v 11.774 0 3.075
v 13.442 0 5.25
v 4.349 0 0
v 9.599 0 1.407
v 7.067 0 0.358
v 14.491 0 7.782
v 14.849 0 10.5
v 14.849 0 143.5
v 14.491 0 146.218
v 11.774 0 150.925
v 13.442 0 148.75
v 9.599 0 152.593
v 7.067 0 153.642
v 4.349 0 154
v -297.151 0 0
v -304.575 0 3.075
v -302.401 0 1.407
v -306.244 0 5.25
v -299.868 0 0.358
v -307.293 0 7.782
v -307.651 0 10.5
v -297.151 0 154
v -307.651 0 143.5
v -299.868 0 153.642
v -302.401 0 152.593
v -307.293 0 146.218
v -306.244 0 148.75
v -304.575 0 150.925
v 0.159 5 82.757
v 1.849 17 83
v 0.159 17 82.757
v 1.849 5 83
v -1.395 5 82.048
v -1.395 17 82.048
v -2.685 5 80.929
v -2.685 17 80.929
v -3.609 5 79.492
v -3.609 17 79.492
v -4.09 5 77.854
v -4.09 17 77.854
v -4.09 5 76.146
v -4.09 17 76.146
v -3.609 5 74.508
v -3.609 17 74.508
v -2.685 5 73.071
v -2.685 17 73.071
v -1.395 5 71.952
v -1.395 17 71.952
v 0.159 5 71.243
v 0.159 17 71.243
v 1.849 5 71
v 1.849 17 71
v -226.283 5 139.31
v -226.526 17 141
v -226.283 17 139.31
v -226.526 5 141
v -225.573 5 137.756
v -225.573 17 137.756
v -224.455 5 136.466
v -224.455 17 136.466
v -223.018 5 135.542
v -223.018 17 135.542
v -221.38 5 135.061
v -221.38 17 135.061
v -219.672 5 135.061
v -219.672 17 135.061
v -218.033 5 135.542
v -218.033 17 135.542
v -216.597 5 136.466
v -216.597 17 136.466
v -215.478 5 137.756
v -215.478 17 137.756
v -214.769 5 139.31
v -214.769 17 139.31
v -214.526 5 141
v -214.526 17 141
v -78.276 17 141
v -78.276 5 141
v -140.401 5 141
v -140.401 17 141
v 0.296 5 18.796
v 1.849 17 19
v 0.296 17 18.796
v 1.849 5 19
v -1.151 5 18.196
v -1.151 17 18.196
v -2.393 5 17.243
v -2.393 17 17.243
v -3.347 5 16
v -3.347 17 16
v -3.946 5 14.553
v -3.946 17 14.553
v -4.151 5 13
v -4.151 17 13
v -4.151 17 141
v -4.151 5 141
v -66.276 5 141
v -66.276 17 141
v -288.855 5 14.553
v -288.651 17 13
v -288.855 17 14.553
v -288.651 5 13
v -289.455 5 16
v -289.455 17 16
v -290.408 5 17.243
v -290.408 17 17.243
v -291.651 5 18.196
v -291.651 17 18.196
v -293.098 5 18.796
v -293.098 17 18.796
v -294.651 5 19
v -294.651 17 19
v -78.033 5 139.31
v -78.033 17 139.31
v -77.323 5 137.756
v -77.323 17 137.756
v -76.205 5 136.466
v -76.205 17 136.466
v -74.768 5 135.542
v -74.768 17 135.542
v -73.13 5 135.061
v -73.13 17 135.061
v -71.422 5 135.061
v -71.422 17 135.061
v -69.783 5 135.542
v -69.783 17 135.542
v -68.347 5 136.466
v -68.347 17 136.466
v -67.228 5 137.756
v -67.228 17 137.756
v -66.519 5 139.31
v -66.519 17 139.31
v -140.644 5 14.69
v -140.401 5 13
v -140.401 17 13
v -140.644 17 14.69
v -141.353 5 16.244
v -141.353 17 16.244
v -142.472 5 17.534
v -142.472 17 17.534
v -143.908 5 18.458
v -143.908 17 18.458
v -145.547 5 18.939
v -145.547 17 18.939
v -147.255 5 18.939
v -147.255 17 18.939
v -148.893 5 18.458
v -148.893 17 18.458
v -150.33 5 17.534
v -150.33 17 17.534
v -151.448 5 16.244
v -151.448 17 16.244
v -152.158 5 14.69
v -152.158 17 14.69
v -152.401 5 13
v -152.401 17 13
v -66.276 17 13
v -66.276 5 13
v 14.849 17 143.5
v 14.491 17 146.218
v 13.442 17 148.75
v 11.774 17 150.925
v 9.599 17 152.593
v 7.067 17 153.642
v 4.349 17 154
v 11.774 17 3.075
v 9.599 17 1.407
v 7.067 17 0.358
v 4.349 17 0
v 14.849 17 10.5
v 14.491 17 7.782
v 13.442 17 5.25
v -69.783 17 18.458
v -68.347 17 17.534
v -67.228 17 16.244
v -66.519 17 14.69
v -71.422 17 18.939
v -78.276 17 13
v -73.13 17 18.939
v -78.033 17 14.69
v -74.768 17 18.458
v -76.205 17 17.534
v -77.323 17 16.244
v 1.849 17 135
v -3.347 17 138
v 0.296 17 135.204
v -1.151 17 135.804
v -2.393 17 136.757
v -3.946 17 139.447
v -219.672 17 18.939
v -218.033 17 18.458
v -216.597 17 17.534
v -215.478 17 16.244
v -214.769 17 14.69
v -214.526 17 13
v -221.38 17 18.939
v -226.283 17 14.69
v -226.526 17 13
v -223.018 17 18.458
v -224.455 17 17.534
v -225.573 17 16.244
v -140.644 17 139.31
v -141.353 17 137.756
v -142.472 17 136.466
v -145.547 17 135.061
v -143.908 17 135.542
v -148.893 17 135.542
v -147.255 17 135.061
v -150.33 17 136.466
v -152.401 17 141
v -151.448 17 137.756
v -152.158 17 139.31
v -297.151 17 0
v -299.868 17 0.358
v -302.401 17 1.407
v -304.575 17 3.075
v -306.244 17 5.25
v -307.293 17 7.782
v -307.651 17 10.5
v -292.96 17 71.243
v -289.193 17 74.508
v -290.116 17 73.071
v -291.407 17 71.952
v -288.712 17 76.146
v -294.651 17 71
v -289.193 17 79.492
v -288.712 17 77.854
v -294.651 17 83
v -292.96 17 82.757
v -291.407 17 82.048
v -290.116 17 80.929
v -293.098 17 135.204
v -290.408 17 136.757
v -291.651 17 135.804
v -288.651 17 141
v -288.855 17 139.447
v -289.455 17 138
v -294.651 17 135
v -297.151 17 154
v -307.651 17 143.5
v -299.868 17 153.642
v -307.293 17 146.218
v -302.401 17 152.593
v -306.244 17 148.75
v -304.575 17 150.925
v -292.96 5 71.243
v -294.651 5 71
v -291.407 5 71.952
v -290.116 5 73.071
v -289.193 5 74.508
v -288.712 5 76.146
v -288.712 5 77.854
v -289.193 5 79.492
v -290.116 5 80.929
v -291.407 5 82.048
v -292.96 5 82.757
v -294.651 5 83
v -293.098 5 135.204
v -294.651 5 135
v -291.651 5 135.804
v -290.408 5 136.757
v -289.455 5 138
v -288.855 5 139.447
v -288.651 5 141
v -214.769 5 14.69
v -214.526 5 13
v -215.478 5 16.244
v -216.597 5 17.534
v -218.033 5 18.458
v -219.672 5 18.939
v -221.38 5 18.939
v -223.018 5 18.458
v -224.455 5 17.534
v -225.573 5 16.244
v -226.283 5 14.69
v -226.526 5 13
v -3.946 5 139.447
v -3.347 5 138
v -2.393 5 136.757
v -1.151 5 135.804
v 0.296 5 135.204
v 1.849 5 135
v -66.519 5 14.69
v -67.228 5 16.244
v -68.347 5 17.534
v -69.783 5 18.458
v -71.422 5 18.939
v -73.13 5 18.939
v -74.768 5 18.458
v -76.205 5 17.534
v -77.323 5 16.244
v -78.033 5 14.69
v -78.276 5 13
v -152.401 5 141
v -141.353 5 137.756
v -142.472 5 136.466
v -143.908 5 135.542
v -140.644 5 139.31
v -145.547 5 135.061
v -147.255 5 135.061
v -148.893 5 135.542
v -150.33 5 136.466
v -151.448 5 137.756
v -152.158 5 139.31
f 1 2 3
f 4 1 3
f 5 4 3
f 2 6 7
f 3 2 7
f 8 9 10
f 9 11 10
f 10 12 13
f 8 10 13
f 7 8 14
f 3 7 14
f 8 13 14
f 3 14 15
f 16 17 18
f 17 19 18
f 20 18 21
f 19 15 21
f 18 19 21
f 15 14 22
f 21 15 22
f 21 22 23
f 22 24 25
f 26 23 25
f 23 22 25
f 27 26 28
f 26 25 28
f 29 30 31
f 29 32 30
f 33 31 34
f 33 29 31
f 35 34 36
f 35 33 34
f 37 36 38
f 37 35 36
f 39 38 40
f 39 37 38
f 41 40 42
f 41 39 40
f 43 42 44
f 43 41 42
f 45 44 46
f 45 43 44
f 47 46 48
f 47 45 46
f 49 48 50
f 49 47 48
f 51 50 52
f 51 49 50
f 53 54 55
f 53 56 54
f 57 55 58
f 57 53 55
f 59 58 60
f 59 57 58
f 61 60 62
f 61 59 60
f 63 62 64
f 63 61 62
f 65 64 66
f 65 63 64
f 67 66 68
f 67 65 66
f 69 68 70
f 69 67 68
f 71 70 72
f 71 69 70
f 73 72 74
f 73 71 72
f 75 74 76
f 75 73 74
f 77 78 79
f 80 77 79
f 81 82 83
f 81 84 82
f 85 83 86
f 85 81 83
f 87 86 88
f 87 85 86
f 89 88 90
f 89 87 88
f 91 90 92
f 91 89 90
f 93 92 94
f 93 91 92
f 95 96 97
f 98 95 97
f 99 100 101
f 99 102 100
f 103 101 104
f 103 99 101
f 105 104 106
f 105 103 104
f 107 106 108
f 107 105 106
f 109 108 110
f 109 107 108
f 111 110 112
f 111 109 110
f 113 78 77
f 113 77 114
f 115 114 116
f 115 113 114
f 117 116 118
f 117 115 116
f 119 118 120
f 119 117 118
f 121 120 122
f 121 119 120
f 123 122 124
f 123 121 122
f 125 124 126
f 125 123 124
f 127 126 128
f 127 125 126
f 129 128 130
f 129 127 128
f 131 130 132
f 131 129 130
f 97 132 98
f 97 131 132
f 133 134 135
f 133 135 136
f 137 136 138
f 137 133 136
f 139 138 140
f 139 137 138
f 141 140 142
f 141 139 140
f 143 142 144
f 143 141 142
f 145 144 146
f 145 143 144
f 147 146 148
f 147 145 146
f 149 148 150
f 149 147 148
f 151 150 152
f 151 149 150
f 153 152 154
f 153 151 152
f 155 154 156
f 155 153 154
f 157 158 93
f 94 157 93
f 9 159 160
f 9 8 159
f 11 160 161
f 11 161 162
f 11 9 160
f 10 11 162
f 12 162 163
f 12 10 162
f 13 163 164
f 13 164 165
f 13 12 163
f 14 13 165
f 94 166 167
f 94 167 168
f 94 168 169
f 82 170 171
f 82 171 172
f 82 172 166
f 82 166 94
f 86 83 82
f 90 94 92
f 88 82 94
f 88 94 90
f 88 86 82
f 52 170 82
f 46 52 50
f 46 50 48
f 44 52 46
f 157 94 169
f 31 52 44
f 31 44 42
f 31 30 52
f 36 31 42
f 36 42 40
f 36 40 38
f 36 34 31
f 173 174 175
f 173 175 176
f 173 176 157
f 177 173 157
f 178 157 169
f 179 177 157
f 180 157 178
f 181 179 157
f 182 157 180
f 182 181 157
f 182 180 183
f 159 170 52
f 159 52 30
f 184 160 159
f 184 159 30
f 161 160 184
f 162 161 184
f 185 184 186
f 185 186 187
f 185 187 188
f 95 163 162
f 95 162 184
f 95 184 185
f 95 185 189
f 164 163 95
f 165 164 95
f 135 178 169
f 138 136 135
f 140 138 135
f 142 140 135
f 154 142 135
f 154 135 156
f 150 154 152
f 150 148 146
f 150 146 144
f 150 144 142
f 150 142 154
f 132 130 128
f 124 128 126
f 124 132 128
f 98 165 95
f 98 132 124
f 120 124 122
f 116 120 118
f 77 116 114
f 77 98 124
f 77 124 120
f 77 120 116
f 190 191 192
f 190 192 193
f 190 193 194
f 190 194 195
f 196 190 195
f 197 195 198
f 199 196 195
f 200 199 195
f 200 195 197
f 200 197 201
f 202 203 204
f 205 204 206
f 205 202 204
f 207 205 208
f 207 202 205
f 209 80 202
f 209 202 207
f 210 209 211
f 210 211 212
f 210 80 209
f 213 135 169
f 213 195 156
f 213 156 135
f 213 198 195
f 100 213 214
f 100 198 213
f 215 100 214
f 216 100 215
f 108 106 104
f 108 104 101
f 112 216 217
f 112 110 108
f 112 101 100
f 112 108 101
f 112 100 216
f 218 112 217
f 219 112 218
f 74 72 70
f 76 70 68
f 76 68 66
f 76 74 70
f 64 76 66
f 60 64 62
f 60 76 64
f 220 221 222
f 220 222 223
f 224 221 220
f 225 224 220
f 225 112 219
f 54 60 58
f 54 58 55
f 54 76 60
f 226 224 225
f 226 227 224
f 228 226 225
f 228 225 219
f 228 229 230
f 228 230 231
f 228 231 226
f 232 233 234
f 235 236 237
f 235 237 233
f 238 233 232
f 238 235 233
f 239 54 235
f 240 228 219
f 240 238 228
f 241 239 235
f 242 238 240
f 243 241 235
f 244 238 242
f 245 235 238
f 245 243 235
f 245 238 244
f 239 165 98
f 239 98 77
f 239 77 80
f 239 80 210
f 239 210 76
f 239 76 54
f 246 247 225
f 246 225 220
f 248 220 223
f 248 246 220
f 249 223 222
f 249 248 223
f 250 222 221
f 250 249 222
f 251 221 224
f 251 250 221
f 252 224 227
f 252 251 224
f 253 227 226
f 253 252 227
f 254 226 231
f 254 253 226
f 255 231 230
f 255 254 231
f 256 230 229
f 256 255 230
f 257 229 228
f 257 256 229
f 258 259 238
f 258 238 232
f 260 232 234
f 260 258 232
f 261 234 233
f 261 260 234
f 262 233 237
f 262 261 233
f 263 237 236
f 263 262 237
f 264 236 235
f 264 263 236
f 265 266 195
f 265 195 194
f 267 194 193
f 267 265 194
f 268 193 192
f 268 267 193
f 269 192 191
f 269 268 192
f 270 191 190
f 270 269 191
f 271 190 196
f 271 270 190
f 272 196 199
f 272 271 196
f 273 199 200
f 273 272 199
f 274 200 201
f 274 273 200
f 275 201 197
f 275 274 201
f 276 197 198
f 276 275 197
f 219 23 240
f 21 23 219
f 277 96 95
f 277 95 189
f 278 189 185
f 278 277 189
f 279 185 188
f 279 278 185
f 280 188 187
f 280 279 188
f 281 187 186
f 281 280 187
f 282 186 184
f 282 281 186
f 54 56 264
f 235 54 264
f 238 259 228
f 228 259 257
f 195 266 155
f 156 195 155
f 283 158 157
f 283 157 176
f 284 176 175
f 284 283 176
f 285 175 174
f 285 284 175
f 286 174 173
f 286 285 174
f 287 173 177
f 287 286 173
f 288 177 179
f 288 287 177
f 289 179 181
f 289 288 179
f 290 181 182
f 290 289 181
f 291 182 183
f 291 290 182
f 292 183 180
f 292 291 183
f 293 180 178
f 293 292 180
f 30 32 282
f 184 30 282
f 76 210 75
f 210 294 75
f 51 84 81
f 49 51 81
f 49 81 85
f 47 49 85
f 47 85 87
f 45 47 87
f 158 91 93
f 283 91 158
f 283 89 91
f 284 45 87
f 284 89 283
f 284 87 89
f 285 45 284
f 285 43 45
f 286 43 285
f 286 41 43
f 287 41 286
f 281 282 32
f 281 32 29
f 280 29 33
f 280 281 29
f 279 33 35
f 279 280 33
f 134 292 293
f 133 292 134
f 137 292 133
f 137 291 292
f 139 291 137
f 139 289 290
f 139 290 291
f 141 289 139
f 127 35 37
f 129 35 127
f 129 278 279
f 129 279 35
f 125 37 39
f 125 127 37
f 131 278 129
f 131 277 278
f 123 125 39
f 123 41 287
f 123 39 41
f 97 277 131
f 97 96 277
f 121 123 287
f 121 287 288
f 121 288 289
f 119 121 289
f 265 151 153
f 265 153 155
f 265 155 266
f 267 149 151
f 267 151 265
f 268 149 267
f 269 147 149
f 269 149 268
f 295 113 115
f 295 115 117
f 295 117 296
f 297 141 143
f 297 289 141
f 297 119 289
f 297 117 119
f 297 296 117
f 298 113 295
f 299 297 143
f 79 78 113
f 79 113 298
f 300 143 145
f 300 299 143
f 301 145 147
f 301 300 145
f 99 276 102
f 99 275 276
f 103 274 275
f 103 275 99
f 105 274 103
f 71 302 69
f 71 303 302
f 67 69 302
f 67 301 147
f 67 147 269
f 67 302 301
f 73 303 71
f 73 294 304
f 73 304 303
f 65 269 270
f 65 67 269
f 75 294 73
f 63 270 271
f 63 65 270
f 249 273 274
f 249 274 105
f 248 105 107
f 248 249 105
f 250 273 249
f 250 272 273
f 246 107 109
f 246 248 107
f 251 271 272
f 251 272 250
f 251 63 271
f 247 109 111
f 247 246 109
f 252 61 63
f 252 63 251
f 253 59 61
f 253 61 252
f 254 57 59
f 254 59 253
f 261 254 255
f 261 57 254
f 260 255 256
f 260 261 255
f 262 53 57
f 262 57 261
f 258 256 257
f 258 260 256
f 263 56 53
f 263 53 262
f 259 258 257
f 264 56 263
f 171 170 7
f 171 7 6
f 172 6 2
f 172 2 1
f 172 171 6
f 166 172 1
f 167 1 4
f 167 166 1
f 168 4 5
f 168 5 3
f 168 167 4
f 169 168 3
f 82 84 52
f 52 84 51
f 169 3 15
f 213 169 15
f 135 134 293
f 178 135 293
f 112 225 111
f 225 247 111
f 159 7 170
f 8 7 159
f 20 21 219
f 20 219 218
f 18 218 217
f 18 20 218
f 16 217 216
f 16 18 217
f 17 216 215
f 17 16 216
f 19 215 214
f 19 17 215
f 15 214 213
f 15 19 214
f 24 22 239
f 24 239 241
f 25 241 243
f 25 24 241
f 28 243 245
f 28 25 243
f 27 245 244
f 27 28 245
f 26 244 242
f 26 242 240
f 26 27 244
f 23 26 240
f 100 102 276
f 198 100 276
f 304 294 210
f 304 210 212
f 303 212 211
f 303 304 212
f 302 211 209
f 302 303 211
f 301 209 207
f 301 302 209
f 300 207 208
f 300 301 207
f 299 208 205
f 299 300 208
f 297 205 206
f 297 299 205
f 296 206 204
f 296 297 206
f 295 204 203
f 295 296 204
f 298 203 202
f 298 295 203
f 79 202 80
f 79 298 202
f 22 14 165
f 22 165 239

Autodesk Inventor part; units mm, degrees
sketch "Эскиз1" plane through (0, 0, 0) normal (0, 1, 0) x (-1, 0, 0)
  arc A0 (294.6508, 19) -> (288.6508, 13) centre (294.6508, 13) ccw
  arc A1 (226.5258, 13) -> (214.5258, 13) centre (220.5258, 13) ccw
  arc A2 (152.4008, 13) -> (140.4008, 13) centre (146.4008, 13) ccw
  arc A3 (4.1508, 13) -> (-1.8492, 19) centre (-1.8492, 13) ccw
  arc A4 (78.2758, 13) -> (66.2758, 13) centre (72.2758, 13) ccw
  arc A5 (294.6508, 83) -> (294.6508, 71) centre (294.6508, 77) ccw
  arc A6 (288.6508, 141) -> (294.6508, 135) centre (294.6508, 141) ccw
  arc A7 (214.5258, 141) -> (226.5258, 141) centre (220.5258, 141) ccw
  arc A8 (140.4008, 141) -> (152.4008, 141) centre (146.4008, 141) ccw
  arc A9 (66.2758, 141) -> (78.2758, 141) centre (72.2758, 141) ccw
  arc A10 (-1.8492, 135) -> (4.1508, 141) centre (-1.8492, 141) ccw
  arc A11 (-1.8492, 71) -> (-1.8492, 83) centre (-1.8492, 77) ccw
  line L0 (-14.8492, 10.5) -> (-14.8492, 143.5)
  line L1 (-14.8492, 10.5) -> (-14.8492, 143.5)
  line L2 (-4.3492, 154) -> (297.1508, 154)
  line L3 (307.6508, 10.5) -> (307.6508, 143.5)
  line L4 (297.1508, 0) -> (-4.3492, 0)
  line L5 (288.6508, 13) -> (226.5258, 13)
  line L6 (214.5258, 13) -> (152.4008, 13)
  line L7 (140.4008, 13) -> (78.2758, 13)
  line L8 (66.2758, 13) -> (4.1508, 13)
  line L9 (-1.8492, 19) -> (-1.8492, 71)
  line L10 (-1.8492, 83) -> (-1.8492, 135)
  line L11 (4.1508, 141) -> (66.2758, 141)
  line L12 (78.2758, 141) -> (140.4008, 141)
  line L13 (152.4008, 141) -> (214.5258, 141)
  line L14 (226.5258, 141) -> (288.6508, 141)
  line L15 (294.6508, 135) -> (294.6508, 83)
  line L16 (294.6508, 71) -> (294.6508, 19)
  line L17 (275.1508, 0) -> (362.1508, 0)
  line L18 (307.6508, 0) -> (-14.8492, 0)
  line L19 (-14.8492, 0) -> (-14.8492, 154)
  line L20 (-14.8492, 154) -> (307.6508, 154)
  line L21 (307.6508, 154) -> (307.6508, 0)
  point P0 (0, 0)
  point P1 (323.6508, -3)
  point P2 (297.1508, 10.5)
  point P3 (-4.3492, 10.5)
  point P4 (-4.3492, 143.5)
  point P5 (146.4008, 13)
  dimension "d0" = 74.125
  dimension "d1" = 74.125
  dimension "d2" = 74.125
  dimension "d3" = 6
  dimension "d4" = 296.5
  dimension "d5" = 322.5
  dimension "d6" = 154
  dimension "d7" = 128
  dimension "d8" = 13
  dimension "d9" = 13
  dimension "d10" = 13
  dimension "d11" = 13
extrude "Выдавливание1" add sketch "Эскиз1" along normal blind 17
extrude "Выдавливание2" add sketch "Эскиз1" along normal blind 5 contours A0 L5 A1 L6 A2 L7 A4 L8 A3 L9 A11 L10 A10 L11 A9 L12 A8 L13 A7 L14 A6 L15 A5 L16 | L0 L19 L20 L2 L21 L3 L17 L4 L18
fillet "Сопряжение1" radius 10.5 4 edges at (-307.6508, 8.5, 0) (14.8492, 8.5, 0) (-307.6508, 8.5, 154) (14.8492, 8.5, 154)
ref_plane "РабПлоскость1" through (0, 14.5, 0) normal (0, 1, 0) x (1, 0, 0)
sketch "Эскиз5" plane through (0, 5, 0) normal (0, 1, 0) x (1, 0, 0)
  line L0 (-140.4008, -13) -> (-78.2758, -13) projected
  arc A0 (-152.4008, -13) -> (-140.4008, -13) centre (-146.4008, -13) ccw projected
  line L1 (-214.5258, -13) -> (-152.4008, -13) projected
  arc A1 (-226.5258, -13) -> (-214.5258, -13) centre (-220.5258, -13) ccw projected
  line L2 (-288.6508, -13) -> (-226.5258, -13) projected
  arc A2 (-294.6508, -19) -> (-288.6508, -13) centre (-294.6508, -13) ccw projected
  line L3 (-294.6508, -71) -> (-294.6508, -19) projected
  arc A3 (-294.6508, -83) -> (-294.6508, -71) centre (-294.6508, -77) ccw projected
  line L4 (-294.6508, -135) -> (-294.6508, -83) projected
  arc A4 (-288.6508, -141) -> (-294.6508, -135) centre (-294.6508, -141) ccw projected
  line L5 (-226.5258, -141) -> (-288.6508, -141) projected
  arc A5 (-214.5258, -141) -> (-226.5258, -141) centre (-220.5258, -141) ccw projected
  line L6 (-152.4008, -141) -> (-214.5258, -141) projected
  arc A6 (-140.4008, -141) -> (-152.4008, -141) centre (-146.4008, -141) ccw projected
  line L7 (-78.2758, -141) -> (-140.4008, -141) projected
  arc A7 (-66.2758, -141) -> (-78.2758, -141) centre (-72.2758, -141) ccw projected
  line L8 (-4.1508, -141) -> (-66.2758, -141) projected
  arc A8 (1.8492, -135) -> (-4.1508, -141) centre (1.8492, -141) ccw projected
  line L9 (1.8492, -83) -> (1.8492, -135) projected
  arc A9 (1.8492, -71) -> (1.8492, -83) centre (1.8492, -77) ccw projected
  line L10 (1.8492, -19) -> (1.8492, -71) projected
  arc A10 (-4.1508, -13) -> (1.8492, -19) centre (1.8492, -13) ccw projected
  line L11 (-66.2758, -13) -> (-4.1508, -13) projected
  arc A11 (-78.2758, -13) -> (-66.2758, -13) centre (-72.2758, -13) ccw projected
  point P0 (0, 0)
sketch "Эскиз4" plane through (0, 14.5, 0) normal (0, 1, 0) x (1, 0, 0)
  line L0 (-140.4008, -13) -> (-78.2758, -13) projected
  arc A0 (-78.2758, -13) -> (-66.2758, -13) centre (-72.2758, -13) ccw projected
  line L1 (-66.2758, -13) -> (-4.1508, -13) projected
  arc A1 (-4.1508, -13) -> (1.8492, -19) centre (1.8492, -13) ccw projected
  line L2 (1.8492, -19) -> (1.8492, -71) projected
  arc A2 (1.8492, -71) -> (1.8492, -83) centre (1.8492, -77) ccw projected
  line L3 (1.8492, -83) -> (1.8492, -135) projected
  arc A3 (1.8492, -135) -> (-4.1508, -141) centre (1.8492, -141) ccw projected
  line L4 (-4.1508, -141) -> (-66.2758, -141) projected
  arc A4 (-66.2758, -141) -> (-78.2758, -141) centre (-72.2758, -141) ccw projected
  line L5 (-78.2758, -141) -> (-140.4008, -141) projected
  arc A5 (-140.4008, -141) -> (-152.4008, -141) centre (-146.4008, -141) ccw projected
  line L6 (-152.4008, -141) -> (-214.5258, -141) projected
  arc A6 (-214.5258, -141) -> (-226.5258, -141) centre (-220.5258, -141) ccw projected
  line L7 (-226.5258, -141) -> (-288.6508, -141) projected
  arc A7 (-288.6508, -141) -> (-294.6508, -135) centre (-294.6508, -141) ccw projected
  line L8 (-294.6508, -135) -> (-294.6508, -83) projected
  arc A8 (-294.6508, -83) -> (-294.6508, -71) centre (-294.6508, -77) ccw projected
  line L9 (-294.6508, -71) -> (-294.6508, -19) projected
  arc A9 (-294.6508, -19) -> (-288.6508, -13) centre (-294.6508, -13) ccw projected
  line L10 (-288.6508, -13) -> (-226.5258, -13) projected
  arc A10 (-226.5258, -13) -> (-214.5258, -13) centre (-220.5258, -13) ccw projected
  line L11 (-214.5258, -13) -> (-152.4008, -13) projected
  arc A11 (-152.4008, -13) -> (-140.4008, -13) centre (-146.4008, -13) ccw projected
  arc A12 (4.3492, -154) -> (14.8492, -143.5) centre (4.3492, -143.5) ccw projected
  line L12 (14.8492, -143.5) -> (14.8492, -10.5) projected
  arc A13 (14.8492, -10.5) -> (4.3492, 0) centre (4.3492, -10.5) ccw projected
  line L13 (4.3492, 0) -> (-297.1508, 0) projected
  arc A14 (-297.1508, 0) -> (-307.6508, -10.5) centre (-297.1508, -10.5) ccw projected
  line L14 (-307.6508, -10.5) -> (-307.6508, -143.5) projected
  arc A15 (-307.6508, -143.5) -> (-297.1508, -154) centre (-297.1508, -143.5) ccw projected
  line L15 (-297.1508, -154) -> (4.3492, -154) projected
  arc A16 (-226.5258, -13) -> (-214.5258, -13) centre (-220.5258, -13) ccw projected
  line L16 (-220.5258, -13) -> (-220.5258, -141)
  line L17 (-146.4008, -13) -> (-146.4008, -141)
  line L18 (-72.2758, -13) -> (-72.2758, -141)
  line L19 (-294.6508, -77) -> (1.8492, -77)
  point P0 (0, 0)
properties part number "Крыша2"
